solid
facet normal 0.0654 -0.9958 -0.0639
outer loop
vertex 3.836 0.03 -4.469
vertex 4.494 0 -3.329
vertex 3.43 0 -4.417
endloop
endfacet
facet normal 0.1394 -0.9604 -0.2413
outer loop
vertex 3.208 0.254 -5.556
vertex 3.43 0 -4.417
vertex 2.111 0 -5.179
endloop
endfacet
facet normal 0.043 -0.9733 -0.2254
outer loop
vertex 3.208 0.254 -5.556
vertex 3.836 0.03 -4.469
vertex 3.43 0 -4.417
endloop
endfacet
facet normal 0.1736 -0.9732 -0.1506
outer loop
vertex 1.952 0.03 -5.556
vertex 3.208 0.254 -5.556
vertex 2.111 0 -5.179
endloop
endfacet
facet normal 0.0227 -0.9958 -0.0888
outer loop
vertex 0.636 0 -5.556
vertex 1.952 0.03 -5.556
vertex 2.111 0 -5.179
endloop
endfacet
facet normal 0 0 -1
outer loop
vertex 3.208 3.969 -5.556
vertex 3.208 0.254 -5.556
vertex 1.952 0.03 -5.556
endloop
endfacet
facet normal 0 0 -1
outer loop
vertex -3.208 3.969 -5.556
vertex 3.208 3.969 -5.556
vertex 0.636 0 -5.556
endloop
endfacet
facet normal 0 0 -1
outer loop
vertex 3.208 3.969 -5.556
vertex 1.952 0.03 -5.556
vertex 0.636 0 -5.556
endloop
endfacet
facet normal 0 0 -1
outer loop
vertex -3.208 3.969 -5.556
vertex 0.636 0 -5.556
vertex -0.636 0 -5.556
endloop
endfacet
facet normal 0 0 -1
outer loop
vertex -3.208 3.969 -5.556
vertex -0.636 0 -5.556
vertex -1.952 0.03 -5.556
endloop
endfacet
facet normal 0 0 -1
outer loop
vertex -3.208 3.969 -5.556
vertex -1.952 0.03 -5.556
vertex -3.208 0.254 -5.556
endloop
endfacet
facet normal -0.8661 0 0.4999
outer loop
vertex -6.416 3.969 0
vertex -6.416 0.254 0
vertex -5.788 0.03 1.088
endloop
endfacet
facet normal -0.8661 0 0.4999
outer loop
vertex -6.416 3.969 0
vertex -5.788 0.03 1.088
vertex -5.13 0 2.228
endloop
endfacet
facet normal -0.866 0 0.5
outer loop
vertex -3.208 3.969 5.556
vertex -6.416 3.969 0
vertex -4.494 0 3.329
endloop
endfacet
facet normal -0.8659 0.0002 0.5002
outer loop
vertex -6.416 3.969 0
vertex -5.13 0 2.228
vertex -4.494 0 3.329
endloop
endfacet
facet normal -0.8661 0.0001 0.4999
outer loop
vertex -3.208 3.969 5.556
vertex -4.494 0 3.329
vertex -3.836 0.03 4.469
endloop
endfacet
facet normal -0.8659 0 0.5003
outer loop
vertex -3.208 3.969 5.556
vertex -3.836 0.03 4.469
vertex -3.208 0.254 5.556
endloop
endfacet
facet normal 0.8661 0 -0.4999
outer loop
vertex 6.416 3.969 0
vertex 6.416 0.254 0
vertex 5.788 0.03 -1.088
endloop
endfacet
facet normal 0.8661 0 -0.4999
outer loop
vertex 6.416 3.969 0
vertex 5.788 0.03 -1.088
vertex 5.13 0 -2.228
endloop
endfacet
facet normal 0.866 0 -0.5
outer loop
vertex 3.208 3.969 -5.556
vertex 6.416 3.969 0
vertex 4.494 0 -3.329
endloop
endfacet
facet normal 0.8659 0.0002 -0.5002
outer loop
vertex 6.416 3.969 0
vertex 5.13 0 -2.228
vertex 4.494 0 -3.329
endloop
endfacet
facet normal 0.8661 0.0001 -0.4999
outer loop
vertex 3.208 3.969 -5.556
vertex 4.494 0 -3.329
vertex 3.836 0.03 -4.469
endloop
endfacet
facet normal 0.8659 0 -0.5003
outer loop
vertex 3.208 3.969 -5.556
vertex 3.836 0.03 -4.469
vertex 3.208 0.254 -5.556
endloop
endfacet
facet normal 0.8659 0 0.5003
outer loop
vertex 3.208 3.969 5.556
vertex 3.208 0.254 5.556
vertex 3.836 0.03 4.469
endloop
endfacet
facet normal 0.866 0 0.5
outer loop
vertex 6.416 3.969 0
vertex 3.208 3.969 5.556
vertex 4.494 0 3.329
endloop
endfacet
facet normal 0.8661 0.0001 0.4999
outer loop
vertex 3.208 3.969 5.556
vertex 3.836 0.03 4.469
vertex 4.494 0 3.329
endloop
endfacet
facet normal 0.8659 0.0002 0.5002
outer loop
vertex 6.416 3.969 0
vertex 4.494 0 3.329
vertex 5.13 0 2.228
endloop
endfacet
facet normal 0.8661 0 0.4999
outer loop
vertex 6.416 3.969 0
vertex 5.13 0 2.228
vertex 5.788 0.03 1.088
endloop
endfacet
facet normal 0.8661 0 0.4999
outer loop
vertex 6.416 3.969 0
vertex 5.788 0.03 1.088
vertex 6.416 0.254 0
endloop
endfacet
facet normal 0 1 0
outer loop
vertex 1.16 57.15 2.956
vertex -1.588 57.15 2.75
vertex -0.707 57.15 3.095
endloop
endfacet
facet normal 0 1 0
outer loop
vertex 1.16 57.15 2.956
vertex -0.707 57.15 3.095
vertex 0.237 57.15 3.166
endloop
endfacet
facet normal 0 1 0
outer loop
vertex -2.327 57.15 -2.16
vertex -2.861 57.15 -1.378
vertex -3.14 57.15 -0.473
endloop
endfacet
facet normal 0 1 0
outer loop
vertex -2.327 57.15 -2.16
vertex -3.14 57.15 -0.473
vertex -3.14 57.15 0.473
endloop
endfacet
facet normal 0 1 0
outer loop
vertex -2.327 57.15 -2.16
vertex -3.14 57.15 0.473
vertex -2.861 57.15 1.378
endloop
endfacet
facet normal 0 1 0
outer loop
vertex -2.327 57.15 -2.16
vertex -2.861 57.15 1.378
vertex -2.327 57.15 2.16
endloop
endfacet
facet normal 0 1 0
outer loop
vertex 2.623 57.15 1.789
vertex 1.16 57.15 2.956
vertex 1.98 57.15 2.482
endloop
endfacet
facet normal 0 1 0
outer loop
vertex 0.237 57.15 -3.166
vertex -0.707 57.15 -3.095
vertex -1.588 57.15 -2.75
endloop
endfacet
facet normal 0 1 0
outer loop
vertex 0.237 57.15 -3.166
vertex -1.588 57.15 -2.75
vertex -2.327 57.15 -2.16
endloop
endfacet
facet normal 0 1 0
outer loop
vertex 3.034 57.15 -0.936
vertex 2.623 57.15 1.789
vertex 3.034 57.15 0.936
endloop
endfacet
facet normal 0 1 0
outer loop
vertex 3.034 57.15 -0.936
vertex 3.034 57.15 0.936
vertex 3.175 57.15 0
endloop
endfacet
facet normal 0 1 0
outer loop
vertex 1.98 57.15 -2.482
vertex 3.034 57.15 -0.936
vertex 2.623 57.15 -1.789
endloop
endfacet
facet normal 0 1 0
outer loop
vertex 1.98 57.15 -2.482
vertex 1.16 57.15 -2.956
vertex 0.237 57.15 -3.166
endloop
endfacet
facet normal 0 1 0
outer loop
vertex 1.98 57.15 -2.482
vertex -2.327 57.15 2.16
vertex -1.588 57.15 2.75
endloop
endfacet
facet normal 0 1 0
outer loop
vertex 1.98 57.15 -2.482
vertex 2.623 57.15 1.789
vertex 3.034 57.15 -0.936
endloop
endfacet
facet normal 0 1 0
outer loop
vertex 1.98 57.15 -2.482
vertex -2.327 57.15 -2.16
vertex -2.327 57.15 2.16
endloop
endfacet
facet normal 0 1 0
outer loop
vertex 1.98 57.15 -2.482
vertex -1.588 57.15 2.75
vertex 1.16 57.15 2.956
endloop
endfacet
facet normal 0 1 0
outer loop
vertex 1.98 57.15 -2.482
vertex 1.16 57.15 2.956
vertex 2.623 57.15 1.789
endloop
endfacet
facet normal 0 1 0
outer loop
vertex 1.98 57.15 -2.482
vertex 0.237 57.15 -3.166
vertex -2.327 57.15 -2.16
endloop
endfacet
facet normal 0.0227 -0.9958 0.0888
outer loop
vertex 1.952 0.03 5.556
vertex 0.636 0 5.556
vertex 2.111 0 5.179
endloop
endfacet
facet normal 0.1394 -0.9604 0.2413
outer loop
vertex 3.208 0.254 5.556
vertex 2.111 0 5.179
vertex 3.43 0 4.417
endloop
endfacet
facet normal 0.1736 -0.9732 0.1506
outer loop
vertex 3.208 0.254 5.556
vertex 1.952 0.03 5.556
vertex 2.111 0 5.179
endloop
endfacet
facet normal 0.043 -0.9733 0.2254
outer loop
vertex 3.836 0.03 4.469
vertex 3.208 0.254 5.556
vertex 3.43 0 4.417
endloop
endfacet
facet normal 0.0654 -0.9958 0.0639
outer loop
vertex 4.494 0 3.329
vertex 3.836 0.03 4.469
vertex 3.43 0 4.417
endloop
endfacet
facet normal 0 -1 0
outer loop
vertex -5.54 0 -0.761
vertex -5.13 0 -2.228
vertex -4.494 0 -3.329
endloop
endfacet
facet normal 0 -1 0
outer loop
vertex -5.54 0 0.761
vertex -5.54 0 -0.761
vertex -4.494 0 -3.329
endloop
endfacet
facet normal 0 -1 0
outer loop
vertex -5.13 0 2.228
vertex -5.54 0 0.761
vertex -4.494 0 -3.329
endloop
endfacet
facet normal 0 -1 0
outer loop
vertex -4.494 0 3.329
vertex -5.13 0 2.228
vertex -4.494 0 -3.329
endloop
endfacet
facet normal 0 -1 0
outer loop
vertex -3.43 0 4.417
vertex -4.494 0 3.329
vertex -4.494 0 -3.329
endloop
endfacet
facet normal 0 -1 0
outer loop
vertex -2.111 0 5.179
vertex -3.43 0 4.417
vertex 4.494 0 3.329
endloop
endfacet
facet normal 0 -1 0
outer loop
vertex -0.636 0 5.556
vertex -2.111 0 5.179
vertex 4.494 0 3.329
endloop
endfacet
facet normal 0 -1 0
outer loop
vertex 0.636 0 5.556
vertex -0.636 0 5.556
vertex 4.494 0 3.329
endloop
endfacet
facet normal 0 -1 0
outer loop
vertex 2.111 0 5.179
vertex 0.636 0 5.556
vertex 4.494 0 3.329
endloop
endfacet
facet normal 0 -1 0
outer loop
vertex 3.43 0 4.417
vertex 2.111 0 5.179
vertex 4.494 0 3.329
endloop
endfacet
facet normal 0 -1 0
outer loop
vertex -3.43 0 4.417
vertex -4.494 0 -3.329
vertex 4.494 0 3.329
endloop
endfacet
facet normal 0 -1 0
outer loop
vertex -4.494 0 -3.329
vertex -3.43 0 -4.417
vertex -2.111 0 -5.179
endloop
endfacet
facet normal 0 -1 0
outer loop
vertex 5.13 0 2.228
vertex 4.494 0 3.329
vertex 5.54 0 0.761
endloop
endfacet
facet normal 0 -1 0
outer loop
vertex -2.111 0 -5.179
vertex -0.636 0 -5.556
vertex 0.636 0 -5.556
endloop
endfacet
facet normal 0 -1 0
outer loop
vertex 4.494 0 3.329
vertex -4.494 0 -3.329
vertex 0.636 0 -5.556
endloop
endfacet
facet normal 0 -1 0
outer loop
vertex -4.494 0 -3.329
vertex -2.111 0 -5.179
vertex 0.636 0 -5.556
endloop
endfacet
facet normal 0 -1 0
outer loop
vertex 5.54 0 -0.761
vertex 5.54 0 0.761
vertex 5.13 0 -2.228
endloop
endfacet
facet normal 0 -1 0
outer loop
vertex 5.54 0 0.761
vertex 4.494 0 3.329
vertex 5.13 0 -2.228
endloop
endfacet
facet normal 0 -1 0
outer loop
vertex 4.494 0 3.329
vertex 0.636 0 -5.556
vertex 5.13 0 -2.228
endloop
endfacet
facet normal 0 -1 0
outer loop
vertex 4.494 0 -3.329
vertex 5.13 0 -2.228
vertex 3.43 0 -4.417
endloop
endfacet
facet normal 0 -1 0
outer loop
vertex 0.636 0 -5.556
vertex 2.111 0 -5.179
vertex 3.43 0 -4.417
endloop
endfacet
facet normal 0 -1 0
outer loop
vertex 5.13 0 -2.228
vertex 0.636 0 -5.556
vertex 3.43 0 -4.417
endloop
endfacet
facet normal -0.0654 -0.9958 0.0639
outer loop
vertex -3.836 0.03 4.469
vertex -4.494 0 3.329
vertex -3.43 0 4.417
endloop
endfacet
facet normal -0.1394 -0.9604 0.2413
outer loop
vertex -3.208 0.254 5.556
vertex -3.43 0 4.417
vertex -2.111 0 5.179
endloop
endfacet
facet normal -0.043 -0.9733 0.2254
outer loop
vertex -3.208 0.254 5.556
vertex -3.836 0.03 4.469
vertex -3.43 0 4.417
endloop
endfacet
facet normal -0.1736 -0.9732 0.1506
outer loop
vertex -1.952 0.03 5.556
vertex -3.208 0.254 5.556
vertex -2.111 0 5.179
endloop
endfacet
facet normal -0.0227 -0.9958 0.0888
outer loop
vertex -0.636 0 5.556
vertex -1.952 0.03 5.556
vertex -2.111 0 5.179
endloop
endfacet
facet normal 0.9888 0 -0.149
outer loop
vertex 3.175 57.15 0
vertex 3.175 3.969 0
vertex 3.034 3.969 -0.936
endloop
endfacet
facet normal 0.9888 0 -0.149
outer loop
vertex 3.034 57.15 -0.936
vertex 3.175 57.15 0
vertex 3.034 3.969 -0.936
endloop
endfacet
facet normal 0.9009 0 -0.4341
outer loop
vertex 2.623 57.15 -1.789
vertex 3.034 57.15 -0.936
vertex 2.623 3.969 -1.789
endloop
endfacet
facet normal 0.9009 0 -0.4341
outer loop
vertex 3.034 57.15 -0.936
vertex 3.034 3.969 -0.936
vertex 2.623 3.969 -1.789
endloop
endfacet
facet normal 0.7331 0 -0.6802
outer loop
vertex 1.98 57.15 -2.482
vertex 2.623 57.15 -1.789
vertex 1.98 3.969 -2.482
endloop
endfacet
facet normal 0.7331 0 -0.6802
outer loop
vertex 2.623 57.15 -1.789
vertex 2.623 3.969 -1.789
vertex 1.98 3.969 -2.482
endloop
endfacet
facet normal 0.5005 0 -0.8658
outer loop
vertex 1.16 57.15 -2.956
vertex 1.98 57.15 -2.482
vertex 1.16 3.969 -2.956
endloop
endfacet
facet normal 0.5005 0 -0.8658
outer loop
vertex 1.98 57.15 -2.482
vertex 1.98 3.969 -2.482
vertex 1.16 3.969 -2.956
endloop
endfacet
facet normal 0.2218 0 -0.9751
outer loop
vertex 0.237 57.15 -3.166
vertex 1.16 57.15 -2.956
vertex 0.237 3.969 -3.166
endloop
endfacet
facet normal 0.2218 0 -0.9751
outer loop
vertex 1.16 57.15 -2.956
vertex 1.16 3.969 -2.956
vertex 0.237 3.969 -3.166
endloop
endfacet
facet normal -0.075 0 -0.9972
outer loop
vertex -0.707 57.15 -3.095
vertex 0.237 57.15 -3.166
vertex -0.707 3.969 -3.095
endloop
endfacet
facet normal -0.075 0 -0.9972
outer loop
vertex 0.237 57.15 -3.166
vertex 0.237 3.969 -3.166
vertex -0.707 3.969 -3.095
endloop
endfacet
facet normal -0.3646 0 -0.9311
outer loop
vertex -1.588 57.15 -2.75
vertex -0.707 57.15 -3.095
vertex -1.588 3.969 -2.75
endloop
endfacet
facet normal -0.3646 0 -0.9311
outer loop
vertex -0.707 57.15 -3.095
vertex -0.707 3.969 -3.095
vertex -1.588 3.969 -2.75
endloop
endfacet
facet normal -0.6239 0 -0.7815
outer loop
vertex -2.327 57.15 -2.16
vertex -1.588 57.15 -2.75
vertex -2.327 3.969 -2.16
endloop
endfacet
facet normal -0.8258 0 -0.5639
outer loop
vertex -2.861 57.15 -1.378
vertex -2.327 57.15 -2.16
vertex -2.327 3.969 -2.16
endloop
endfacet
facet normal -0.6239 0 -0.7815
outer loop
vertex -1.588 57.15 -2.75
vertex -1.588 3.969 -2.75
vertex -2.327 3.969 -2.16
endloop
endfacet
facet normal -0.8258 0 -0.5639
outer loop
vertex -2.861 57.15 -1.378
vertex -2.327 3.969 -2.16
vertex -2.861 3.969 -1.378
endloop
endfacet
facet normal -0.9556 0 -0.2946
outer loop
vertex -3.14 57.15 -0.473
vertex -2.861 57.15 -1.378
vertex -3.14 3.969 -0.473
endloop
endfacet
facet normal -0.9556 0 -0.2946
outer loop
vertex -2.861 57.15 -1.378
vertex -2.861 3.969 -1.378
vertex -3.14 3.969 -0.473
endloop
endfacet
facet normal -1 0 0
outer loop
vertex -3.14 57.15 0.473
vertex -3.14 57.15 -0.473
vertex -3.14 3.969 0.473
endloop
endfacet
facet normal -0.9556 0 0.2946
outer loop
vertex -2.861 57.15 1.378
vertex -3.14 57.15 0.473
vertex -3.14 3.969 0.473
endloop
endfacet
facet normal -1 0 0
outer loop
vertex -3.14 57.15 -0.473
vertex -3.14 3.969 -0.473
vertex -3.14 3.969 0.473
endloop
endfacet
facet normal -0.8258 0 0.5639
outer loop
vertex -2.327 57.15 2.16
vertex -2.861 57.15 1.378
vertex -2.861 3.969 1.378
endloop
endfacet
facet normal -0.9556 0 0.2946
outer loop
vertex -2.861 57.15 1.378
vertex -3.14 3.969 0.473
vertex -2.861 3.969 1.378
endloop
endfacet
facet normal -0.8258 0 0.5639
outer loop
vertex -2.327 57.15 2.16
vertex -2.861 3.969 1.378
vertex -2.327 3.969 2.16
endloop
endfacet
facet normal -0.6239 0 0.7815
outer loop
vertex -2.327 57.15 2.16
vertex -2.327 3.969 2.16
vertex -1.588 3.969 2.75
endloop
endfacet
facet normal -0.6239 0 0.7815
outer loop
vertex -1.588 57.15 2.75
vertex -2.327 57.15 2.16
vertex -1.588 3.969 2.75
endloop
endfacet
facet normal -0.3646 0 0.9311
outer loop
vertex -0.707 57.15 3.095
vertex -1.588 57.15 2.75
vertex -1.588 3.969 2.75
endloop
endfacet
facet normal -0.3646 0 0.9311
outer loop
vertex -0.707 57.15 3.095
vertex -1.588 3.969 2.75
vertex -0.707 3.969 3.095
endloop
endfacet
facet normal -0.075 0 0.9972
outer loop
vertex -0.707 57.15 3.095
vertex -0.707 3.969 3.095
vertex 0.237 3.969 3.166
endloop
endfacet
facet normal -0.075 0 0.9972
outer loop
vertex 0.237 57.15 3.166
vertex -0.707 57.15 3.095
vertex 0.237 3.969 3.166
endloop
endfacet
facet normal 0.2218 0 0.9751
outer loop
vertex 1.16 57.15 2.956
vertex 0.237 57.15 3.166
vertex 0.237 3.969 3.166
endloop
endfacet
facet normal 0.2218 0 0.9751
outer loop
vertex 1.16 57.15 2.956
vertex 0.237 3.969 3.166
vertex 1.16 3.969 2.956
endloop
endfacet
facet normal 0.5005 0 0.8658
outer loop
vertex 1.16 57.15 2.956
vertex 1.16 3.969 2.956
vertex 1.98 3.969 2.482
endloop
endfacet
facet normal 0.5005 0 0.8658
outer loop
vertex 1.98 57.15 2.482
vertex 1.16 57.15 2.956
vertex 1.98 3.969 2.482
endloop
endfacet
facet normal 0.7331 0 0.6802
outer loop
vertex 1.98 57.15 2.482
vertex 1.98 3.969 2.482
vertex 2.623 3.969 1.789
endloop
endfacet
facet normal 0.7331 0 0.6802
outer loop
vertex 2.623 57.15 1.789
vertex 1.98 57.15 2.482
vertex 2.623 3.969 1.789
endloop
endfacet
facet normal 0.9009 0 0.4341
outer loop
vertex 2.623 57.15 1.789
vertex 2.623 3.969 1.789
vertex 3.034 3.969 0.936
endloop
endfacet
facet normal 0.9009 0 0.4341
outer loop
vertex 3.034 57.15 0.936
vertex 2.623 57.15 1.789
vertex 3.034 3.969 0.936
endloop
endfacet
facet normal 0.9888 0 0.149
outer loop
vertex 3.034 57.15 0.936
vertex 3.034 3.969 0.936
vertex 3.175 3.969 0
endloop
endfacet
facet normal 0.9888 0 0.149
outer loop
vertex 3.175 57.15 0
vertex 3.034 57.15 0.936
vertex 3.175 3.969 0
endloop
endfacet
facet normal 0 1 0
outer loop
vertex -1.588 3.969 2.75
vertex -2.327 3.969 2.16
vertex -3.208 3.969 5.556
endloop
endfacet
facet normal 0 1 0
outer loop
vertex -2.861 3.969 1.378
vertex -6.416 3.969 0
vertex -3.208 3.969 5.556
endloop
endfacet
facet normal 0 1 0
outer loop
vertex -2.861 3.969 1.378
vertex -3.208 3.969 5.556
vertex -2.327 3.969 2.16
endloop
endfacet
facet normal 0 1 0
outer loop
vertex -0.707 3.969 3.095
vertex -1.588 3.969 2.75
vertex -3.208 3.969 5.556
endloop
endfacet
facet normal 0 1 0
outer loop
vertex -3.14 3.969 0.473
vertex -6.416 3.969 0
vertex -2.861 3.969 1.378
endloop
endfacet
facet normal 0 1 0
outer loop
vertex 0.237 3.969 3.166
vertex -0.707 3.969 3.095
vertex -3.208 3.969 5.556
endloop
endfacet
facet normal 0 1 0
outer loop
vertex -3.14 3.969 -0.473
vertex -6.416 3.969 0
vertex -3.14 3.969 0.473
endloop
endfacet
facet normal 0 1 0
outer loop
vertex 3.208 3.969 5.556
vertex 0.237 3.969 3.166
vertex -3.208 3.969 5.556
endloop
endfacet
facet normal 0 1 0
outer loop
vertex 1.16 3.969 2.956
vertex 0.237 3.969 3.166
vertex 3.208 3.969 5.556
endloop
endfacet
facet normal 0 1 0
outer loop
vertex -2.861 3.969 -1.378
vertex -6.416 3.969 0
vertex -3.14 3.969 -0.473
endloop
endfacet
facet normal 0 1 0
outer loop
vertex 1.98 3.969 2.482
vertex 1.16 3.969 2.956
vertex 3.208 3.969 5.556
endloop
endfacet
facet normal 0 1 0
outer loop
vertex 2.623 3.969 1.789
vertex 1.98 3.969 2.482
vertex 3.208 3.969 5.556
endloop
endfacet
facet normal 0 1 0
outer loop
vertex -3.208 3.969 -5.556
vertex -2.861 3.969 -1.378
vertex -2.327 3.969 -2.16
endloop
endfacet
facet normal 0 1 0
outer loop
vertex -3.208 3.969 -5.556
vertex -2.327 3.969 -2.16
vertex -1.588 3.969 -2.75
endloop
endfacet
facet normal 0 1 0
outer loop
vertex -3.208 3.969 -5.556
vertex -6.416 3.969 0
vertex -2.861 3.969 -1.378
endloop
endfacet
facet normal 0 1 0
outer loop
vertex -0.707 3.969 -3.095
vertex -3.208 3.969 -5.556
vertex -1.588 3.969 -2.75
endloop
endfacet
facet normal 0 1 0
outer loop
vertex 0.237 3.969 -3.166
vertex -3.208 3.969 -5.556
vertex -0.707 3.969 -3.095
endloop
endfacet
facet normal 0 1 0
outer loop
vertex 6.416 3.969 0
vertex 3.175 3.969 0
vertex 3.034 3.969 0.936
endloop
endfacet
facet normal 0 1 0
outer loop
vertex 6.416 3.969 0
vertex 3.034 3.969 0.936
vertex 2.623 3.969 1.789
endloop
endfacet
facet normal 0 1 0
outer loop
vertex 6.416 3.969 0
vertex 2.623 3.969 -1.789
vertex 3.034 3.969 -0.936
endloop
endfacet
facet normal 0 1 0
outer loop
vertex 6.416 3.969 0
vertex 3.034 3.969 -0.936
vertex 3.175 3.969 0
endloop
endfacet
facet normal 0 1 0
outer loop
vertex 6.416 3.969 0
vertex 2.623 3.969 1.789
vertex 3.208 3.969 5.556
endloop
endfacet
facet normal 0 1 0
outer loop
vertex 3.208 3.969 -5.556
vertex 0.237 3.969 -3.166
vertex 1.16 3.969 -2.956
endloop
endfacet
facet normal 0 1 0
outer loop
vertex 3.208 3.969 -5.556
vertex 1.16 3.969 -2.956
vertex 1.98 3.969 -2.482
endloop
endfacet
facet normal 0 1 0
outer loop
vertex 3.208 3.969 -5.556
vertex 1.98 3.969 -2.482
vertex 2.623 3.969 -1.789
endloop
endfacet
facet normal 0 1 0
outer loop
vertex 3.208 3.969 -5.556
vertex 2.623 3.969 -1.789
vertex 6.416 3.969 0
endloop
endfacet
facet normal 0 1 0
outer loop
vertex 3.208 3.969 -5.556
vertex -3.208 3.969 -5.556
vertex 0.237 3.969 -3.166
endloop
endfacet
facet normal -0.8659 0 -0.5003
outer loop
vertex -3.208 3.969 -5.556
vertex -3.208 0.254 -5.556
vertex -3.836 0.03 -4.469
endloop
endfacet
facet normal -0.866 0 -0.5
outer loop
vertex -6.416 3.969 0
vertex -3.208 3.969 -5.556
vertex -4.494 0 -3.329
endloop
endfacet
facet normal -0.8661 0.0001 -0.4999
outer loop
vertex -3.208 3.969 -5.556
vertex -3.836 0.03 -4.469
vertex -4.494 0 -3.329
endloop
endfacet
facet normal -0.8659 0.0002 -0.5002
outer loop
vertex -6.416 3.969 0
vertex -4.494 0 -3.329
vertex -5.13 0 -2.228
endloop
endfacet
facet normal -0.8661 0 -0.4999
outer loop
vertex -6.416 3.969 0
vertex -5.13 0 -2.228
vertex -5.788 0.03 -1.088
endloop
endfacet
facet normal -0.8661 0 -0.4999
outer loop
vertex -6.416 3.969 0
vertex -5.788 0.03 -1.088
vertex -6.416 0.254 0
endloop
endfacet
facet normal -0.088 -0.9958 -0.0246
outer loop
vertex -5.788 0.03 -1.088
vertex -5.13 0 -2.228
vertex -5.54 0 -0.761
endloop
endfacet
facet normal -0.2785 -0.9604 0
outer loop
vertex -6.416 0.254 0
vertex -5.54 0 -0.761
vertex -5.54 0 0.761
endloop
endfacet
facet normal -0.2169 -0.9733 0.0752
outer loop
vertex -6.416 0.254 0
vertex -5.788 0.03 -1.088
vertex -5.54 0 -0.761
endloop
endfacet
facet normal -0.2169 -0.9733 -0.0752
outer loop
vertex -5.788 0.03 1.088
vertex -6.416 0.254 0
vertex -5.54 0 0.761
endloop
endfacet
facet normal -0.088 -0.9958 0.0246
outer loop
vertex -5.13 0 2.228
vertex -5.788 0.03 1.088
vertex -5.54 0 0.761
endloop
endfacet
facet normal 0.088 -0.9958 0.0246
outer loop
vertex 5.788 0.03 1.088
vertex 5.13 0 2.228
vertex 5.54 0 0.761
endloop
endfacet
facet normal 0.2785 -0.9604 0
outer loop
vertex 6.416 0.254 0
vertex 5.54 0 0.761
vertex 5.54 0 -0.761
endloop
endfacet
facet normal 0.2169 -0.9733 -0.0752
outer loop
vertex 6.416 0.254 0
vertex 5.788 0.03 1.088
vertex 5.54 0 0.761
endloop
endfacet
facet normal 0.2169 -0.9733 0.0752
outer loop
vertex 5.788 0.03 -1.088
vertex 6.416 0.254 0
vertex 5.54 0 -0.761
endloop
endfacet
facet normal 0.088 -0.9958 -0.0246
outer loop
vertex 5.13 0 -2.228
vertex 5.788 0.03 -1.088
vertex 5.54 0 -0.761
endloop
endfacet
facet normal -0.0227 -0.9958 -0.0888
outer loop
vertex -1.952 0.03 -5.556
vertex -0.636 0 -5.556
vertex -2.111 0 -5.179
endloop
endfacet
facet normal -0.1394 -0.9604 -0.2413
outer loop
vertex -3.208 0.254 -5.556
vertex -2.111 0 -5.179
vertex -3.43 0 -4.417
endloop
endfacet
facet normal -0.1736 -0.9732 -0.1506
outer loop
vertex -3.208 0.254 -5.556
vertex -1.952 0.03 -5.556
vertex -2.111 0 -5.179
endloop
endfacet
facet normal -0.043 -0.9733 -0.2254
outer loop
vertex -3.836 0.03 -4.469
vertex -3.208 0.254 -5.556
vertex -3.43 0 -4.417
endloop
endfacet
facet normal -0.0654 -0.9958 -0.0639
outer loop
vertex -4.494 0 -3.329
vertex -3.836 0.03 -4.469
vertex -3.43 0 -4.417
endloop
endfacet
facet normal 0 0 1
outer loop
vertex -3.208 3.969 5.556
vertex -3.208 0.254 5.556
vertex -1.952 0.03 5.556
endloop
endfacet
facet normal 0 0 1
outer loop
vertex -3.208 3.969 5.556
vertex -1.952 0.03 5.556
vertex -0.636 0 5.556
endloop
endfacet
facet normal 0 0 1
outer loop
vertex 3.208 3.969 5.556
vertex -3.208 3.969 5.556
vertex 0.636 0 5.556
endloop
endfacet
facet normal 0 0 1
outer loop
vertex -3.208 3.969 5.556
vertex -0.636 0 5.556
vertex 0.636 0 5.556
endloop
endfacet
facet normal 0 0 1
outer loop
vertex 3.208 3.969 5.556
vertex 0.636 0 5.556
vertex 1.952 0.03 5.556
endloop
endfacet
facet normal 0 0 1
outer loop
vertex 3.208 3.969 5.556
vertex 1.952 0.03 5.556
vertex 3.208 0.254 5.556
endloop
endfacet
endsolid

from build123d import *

# Parameters (mm, degrees)
BOSS_EXTRUDE1_DEPTH = 3.96875
SKETCH3_R           = 3.175
BOSS_EXTRUDE2_DEPTH = 57.15


with BuildPart() as part:
    # Sketch1 → Boss-Extrude1 (new body)
    with BuildSketch(Plane(origin=(0, 0, 0), x_dir=(1, 0, 0), z_dir=(0, 1, 0))):
        Polygon((6.415804866, 0), (3.207902433, 5.55625), (-3.207902433, 5.55625), (-6.415804866, 0), (-3.207902433, -5.55625), (3.207902433, -5.55625), align=None)
    extrude(amount=BOSS_EXTRUDE1_DEPTH)

    # Sketch2 → Cut-Revolve1 (revolve, cut)
    with BuildSketch(Plane.XY):
        with BuildLine():
            Line((6.415804866, 0.254), (6.415804866, 0))
            Line((6.415804866, 0), (5.592494081, 0))
            ThreePointArc((5.592494081, 0), (6.023294687, 0.064943068), (6.415804866, 0.254))
        make_face()
    revolve(axis=Axis((0, 0, 0), (0, 1, 0)), mode=Mode.SUBTRACT)

    # Sketch3 → Boss-Extrude2 (add)
    with BuildSketch(Plane(origin=(0, 0, 0), x_dir=(1, 0, 0), z_dir=(0, 1, 0))):
        Circle(SKETCH3_R)
    extrude(amount=BOSS_EXTRUDE2_DEPTH)


solid = part.part
